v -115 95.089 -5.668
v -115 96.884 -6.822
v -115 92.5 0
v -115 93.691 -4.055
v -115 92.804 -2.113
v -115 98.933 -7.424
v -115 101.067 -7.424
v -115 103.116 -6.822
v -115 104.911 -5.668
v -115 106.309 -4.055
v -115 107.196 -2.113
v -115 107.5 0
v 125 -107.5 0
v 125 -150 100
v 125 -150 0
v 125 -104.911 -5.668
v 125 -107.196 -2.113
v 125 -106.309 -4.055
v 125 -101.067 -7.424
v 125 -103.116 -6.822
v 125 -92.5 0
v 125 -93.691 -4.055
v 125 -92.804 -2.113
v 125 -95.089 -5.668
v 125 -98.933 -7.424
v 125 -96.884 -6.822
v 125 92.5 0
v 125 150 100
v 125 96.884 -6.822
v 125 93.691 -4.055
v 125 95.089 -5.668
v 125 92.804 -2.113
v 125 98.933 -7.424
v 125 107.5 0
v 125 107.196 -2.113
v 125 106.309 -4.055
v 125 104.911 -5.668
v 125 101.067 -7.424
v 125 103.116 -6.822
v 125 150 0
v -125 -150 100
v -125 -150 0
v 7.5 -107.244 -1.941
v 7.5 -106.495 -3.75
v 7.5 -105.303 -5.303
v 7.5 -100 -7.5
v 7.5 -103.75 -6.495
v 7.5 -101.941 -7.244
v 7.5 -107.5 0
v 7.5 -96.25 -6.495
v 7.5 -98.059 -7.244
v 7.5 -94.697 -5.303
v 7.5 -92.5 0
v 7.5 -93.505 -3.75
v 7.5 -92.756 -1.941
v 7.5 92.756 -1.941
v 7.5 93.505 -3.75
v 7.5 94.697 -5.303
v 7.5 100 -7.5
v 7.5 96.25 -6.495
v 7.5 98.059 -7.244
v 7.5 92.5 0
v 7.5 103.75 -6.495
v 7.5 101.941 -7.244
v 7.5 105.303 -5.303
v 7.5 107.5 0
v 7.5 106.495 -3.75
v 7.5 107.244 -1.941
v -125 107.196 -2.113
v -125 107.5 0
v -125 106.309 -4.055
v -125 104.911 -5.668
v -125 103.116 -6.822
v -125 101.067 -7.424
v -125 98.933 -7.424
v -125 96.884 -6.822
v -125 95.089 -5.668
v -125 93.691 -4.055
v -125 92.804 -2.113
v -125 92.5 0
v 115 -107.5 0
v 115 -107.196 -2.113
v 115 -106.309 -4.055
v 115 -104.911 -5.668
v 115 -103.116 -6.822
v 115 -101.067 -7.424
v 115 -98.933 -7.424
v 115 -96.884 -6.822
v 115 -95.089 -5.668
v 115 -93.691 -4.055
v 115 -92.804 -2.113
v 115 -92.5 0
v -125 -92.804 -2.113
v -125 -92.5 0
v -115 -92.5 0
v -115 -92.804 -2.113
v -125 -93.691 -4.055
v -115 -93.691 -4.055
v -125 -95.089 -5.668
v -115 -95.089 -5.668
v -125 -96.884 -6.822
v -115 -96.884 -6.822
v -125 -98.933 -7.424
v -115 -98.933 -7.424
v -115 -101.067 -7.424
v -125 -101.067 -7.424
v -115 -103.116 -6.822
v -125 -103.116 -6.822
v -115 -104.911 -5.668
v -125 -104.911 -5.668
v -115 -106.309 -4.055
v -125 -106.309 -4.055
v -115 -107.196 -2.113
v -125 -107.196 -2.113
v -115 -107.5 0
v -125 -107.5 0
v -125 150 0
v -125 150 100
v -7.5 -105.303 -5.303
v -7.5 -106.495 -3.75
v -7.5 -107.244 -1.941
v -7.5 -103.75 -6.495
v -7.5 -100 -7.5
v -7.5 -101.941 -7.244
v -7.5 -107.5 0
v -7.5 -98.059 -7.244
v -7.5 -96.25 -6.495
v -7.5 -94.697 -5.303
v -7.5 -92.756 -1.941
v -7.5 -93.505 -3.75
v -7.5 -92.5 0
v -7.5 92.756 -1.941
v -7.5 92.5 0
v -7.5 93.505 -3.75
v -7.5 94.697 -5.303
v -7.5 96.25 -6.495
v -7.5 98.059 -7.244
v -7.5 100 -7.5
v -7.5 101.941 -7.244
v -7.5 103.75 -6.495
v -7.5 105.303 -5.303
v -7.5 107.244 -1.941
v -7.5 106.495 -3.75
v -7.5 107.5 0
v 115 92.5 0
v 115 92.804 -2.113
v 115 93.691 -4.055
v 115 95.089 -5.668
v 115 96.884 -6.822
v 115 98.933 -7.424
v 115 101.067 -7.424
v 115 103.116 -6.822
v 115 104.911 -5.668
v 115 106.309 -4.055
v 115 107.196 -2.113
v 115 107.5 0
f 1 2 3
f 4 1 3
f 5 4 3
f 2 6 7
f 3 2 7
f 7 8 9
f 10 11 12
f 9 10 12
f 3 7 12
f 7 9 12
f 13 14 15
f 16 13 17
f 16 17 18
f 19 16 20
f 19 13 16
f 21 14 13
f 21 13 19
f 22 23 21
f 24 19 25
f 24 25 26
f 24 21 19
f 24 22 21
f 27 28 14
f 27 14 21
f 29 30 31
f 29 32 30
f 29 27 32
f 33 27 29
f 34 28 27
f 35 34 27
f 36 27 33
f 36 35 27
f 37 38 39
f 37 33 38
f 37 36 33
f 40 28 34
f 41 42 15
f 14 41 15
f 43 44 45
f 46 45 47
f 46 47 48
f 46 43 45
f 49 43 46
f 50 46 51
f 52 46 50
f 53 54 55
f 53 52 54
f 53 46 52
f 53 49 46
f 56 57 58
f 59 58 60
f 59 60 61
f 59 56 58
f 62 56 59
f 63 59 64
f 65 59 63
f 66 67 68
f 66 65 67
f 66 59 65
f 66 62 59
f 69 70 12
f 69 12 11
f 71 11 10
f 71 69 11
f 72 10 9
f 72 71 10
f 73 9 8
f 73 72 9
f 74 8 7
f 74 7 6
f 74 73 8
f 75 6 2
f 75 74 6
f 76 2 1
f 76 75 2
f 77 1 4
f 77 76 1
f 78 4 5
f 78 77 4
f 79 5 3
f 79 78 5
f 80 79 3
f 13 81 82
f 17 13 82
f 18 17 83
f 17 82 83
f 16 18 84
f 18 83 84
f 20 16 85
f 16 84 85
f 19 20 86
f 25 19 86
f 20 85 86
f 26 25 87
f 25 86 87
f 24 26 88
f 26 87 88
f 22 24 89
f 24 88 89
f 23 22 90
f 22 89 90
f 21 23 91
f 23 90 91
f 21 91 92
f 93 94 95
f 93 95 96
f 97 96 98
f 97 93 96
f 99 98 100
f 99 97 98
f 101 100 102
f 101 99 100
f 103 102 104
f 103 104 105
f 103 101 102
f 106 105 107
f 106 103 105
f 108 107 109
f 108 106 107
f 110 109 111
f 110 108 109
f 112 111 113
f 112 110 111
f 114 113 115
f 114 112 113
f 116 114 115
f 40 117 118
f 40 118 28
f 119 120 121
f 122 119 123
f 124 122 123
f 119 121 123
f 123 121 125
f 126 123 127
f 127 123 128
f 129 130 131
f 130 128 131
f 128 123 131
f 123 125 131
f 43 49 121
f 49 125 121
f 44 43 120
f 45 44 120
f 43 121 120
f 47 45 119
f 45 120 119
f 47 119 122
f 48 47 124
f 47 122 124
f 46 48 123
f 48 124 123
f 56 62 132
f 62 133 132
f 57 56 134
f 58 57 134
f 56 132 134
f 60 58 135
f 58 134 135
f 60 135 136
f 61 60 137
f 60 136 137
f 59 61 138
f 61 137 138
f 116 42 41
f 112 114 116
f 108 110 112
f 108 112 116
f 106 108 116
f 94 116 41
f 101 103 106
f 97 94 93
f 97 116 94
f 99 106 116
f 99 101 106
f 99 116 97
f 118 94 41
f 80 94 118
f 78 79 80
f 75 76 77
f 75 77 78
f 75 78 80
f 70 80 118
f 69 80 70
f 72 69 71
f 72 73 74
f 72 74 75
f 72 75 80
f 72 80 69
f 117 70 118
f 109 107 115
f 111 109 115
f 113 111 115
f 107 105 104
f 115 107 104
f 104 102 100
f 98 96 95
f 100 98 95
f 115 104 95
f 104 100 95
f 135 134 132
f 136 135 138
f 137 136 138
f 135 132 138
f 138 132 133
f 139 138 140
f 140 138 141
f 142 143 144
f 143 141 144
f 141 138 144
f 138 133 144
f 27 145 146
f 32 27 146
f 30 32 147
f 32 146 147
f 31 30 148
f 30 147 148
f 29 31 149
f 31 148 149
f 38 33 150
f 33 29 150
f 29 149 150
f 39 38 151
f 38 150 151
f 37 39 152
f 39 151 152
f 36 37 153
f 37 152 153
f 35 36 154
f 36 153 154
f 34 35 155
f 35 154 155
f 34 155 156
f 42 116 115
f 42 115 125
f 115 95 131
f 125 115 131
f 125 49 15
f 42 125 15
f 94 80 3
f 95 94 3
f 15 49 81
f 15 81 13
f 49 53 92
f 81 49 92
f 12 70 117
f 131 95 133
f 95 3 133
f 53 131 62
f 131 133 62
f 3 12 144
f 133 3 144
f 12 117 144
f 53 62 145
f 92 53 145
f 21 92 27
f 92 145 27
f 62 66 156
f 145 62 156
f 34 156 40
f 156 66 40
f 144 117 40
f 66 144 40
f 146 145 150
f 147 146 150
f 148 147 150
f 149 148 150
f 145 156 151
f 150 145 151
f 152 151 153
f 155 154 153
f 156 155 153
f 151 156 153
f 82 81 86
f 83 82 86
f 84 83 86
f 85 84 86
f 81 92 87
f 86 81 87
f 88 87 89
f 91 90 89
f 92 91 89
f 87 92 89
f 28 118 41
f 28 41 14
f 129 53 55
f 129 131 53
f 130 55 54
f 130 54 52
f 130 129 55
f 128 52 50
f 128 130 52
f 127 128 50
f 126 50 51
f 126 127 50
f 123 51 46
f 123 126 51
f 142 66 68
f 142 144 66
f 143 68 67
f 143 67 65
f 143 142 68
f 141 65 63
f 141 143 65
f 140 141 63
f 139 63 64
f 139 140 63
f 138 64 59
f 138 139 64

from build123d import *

# Parameters (mm, degrees)
SKETCH1_W           = 250
SKETCH1_H           = 300
BOSS_EXTRUDE1_DEPTH = 100
SKETCH2_W           = 15
SKETCH2_H           = 15
BOSS_EXTRUDE2_DEPTH = 7.5
FILLET1_R           = 7.5
SKETCH3_R           = 7.5
BOSS_EXTRUDE3_DEPTH = 10
BOSS_EXTRUDE4_START = -10
SKETCH4_R           = 7.5
BOSS_EXTRUDE4_DEPTH = 10


with BuildPart() as part:
    # Sketch1 → Boss-Extrude1 (new body)
    with BuildSketch(Plane.XY):
        Rectangle(SKETCH1_W, SKETCH1_H)
    extrude(amount=BOSS_EXTRUDE1_DEPTH)

    # Sketch2 → Boss-Extrude2 (add)
    with BuildSketch(Plane(origin=(0, 0, 0), x_dir=(-1, 0, 0), z_dir=(0, 0, -1))):
        with Locations((0, 100)):
            Rectangle(SKETCH2_W, SKETCH2_H)
        with Locations((0, -100)):
            Rectangle(SKETCH2_W, SKETCH2_H)
    extrude(amount=BOSS_EXTRUDE2_DEPTH)

    # Fillet1
    fillet1_edges = [part.edges().sort_by_distance(p)[0] for p in [
        (0, 107.5, -7.5),
        (0, 92.5, -7.5),
        (0, -107.5, -7.5),
        (0, -92.5, -7.5),
    ]]
    fillet(fillet1_edges, radius=FILLET1_R - 0.0001)  # a hair under: the kernel refuses the full size

    # Sketch3 → Boss-Extrude3 (add)
    with BuildSketch(Plane.ZY.offset(125)):
        with Locations((0, 100)):
            Circle(SKETCH3_R)
        with Locations((0, -100)):
            Circle(SKETCH3_R)
    extrude(amount=-BOSS_EXTRUDE3_DEPTH)

    # Sketch4 → Boss-Extrude4 (add)
    with BuildSketch(Plane(origin=(125, 0, 0), x_dir=(0, 0, -1), z_dir=(1, 0, 0)).offset(BOSS_EXTRUDE4_START)):
        with Locations((0, 100)):
            Circle(SKETCH4_R)
        with Locations((0, -100)):
            Circle(SKETCH4_R)
    extrude(amount=BOSS_EXTRUDE4_DEPTH)


solid = part.part
